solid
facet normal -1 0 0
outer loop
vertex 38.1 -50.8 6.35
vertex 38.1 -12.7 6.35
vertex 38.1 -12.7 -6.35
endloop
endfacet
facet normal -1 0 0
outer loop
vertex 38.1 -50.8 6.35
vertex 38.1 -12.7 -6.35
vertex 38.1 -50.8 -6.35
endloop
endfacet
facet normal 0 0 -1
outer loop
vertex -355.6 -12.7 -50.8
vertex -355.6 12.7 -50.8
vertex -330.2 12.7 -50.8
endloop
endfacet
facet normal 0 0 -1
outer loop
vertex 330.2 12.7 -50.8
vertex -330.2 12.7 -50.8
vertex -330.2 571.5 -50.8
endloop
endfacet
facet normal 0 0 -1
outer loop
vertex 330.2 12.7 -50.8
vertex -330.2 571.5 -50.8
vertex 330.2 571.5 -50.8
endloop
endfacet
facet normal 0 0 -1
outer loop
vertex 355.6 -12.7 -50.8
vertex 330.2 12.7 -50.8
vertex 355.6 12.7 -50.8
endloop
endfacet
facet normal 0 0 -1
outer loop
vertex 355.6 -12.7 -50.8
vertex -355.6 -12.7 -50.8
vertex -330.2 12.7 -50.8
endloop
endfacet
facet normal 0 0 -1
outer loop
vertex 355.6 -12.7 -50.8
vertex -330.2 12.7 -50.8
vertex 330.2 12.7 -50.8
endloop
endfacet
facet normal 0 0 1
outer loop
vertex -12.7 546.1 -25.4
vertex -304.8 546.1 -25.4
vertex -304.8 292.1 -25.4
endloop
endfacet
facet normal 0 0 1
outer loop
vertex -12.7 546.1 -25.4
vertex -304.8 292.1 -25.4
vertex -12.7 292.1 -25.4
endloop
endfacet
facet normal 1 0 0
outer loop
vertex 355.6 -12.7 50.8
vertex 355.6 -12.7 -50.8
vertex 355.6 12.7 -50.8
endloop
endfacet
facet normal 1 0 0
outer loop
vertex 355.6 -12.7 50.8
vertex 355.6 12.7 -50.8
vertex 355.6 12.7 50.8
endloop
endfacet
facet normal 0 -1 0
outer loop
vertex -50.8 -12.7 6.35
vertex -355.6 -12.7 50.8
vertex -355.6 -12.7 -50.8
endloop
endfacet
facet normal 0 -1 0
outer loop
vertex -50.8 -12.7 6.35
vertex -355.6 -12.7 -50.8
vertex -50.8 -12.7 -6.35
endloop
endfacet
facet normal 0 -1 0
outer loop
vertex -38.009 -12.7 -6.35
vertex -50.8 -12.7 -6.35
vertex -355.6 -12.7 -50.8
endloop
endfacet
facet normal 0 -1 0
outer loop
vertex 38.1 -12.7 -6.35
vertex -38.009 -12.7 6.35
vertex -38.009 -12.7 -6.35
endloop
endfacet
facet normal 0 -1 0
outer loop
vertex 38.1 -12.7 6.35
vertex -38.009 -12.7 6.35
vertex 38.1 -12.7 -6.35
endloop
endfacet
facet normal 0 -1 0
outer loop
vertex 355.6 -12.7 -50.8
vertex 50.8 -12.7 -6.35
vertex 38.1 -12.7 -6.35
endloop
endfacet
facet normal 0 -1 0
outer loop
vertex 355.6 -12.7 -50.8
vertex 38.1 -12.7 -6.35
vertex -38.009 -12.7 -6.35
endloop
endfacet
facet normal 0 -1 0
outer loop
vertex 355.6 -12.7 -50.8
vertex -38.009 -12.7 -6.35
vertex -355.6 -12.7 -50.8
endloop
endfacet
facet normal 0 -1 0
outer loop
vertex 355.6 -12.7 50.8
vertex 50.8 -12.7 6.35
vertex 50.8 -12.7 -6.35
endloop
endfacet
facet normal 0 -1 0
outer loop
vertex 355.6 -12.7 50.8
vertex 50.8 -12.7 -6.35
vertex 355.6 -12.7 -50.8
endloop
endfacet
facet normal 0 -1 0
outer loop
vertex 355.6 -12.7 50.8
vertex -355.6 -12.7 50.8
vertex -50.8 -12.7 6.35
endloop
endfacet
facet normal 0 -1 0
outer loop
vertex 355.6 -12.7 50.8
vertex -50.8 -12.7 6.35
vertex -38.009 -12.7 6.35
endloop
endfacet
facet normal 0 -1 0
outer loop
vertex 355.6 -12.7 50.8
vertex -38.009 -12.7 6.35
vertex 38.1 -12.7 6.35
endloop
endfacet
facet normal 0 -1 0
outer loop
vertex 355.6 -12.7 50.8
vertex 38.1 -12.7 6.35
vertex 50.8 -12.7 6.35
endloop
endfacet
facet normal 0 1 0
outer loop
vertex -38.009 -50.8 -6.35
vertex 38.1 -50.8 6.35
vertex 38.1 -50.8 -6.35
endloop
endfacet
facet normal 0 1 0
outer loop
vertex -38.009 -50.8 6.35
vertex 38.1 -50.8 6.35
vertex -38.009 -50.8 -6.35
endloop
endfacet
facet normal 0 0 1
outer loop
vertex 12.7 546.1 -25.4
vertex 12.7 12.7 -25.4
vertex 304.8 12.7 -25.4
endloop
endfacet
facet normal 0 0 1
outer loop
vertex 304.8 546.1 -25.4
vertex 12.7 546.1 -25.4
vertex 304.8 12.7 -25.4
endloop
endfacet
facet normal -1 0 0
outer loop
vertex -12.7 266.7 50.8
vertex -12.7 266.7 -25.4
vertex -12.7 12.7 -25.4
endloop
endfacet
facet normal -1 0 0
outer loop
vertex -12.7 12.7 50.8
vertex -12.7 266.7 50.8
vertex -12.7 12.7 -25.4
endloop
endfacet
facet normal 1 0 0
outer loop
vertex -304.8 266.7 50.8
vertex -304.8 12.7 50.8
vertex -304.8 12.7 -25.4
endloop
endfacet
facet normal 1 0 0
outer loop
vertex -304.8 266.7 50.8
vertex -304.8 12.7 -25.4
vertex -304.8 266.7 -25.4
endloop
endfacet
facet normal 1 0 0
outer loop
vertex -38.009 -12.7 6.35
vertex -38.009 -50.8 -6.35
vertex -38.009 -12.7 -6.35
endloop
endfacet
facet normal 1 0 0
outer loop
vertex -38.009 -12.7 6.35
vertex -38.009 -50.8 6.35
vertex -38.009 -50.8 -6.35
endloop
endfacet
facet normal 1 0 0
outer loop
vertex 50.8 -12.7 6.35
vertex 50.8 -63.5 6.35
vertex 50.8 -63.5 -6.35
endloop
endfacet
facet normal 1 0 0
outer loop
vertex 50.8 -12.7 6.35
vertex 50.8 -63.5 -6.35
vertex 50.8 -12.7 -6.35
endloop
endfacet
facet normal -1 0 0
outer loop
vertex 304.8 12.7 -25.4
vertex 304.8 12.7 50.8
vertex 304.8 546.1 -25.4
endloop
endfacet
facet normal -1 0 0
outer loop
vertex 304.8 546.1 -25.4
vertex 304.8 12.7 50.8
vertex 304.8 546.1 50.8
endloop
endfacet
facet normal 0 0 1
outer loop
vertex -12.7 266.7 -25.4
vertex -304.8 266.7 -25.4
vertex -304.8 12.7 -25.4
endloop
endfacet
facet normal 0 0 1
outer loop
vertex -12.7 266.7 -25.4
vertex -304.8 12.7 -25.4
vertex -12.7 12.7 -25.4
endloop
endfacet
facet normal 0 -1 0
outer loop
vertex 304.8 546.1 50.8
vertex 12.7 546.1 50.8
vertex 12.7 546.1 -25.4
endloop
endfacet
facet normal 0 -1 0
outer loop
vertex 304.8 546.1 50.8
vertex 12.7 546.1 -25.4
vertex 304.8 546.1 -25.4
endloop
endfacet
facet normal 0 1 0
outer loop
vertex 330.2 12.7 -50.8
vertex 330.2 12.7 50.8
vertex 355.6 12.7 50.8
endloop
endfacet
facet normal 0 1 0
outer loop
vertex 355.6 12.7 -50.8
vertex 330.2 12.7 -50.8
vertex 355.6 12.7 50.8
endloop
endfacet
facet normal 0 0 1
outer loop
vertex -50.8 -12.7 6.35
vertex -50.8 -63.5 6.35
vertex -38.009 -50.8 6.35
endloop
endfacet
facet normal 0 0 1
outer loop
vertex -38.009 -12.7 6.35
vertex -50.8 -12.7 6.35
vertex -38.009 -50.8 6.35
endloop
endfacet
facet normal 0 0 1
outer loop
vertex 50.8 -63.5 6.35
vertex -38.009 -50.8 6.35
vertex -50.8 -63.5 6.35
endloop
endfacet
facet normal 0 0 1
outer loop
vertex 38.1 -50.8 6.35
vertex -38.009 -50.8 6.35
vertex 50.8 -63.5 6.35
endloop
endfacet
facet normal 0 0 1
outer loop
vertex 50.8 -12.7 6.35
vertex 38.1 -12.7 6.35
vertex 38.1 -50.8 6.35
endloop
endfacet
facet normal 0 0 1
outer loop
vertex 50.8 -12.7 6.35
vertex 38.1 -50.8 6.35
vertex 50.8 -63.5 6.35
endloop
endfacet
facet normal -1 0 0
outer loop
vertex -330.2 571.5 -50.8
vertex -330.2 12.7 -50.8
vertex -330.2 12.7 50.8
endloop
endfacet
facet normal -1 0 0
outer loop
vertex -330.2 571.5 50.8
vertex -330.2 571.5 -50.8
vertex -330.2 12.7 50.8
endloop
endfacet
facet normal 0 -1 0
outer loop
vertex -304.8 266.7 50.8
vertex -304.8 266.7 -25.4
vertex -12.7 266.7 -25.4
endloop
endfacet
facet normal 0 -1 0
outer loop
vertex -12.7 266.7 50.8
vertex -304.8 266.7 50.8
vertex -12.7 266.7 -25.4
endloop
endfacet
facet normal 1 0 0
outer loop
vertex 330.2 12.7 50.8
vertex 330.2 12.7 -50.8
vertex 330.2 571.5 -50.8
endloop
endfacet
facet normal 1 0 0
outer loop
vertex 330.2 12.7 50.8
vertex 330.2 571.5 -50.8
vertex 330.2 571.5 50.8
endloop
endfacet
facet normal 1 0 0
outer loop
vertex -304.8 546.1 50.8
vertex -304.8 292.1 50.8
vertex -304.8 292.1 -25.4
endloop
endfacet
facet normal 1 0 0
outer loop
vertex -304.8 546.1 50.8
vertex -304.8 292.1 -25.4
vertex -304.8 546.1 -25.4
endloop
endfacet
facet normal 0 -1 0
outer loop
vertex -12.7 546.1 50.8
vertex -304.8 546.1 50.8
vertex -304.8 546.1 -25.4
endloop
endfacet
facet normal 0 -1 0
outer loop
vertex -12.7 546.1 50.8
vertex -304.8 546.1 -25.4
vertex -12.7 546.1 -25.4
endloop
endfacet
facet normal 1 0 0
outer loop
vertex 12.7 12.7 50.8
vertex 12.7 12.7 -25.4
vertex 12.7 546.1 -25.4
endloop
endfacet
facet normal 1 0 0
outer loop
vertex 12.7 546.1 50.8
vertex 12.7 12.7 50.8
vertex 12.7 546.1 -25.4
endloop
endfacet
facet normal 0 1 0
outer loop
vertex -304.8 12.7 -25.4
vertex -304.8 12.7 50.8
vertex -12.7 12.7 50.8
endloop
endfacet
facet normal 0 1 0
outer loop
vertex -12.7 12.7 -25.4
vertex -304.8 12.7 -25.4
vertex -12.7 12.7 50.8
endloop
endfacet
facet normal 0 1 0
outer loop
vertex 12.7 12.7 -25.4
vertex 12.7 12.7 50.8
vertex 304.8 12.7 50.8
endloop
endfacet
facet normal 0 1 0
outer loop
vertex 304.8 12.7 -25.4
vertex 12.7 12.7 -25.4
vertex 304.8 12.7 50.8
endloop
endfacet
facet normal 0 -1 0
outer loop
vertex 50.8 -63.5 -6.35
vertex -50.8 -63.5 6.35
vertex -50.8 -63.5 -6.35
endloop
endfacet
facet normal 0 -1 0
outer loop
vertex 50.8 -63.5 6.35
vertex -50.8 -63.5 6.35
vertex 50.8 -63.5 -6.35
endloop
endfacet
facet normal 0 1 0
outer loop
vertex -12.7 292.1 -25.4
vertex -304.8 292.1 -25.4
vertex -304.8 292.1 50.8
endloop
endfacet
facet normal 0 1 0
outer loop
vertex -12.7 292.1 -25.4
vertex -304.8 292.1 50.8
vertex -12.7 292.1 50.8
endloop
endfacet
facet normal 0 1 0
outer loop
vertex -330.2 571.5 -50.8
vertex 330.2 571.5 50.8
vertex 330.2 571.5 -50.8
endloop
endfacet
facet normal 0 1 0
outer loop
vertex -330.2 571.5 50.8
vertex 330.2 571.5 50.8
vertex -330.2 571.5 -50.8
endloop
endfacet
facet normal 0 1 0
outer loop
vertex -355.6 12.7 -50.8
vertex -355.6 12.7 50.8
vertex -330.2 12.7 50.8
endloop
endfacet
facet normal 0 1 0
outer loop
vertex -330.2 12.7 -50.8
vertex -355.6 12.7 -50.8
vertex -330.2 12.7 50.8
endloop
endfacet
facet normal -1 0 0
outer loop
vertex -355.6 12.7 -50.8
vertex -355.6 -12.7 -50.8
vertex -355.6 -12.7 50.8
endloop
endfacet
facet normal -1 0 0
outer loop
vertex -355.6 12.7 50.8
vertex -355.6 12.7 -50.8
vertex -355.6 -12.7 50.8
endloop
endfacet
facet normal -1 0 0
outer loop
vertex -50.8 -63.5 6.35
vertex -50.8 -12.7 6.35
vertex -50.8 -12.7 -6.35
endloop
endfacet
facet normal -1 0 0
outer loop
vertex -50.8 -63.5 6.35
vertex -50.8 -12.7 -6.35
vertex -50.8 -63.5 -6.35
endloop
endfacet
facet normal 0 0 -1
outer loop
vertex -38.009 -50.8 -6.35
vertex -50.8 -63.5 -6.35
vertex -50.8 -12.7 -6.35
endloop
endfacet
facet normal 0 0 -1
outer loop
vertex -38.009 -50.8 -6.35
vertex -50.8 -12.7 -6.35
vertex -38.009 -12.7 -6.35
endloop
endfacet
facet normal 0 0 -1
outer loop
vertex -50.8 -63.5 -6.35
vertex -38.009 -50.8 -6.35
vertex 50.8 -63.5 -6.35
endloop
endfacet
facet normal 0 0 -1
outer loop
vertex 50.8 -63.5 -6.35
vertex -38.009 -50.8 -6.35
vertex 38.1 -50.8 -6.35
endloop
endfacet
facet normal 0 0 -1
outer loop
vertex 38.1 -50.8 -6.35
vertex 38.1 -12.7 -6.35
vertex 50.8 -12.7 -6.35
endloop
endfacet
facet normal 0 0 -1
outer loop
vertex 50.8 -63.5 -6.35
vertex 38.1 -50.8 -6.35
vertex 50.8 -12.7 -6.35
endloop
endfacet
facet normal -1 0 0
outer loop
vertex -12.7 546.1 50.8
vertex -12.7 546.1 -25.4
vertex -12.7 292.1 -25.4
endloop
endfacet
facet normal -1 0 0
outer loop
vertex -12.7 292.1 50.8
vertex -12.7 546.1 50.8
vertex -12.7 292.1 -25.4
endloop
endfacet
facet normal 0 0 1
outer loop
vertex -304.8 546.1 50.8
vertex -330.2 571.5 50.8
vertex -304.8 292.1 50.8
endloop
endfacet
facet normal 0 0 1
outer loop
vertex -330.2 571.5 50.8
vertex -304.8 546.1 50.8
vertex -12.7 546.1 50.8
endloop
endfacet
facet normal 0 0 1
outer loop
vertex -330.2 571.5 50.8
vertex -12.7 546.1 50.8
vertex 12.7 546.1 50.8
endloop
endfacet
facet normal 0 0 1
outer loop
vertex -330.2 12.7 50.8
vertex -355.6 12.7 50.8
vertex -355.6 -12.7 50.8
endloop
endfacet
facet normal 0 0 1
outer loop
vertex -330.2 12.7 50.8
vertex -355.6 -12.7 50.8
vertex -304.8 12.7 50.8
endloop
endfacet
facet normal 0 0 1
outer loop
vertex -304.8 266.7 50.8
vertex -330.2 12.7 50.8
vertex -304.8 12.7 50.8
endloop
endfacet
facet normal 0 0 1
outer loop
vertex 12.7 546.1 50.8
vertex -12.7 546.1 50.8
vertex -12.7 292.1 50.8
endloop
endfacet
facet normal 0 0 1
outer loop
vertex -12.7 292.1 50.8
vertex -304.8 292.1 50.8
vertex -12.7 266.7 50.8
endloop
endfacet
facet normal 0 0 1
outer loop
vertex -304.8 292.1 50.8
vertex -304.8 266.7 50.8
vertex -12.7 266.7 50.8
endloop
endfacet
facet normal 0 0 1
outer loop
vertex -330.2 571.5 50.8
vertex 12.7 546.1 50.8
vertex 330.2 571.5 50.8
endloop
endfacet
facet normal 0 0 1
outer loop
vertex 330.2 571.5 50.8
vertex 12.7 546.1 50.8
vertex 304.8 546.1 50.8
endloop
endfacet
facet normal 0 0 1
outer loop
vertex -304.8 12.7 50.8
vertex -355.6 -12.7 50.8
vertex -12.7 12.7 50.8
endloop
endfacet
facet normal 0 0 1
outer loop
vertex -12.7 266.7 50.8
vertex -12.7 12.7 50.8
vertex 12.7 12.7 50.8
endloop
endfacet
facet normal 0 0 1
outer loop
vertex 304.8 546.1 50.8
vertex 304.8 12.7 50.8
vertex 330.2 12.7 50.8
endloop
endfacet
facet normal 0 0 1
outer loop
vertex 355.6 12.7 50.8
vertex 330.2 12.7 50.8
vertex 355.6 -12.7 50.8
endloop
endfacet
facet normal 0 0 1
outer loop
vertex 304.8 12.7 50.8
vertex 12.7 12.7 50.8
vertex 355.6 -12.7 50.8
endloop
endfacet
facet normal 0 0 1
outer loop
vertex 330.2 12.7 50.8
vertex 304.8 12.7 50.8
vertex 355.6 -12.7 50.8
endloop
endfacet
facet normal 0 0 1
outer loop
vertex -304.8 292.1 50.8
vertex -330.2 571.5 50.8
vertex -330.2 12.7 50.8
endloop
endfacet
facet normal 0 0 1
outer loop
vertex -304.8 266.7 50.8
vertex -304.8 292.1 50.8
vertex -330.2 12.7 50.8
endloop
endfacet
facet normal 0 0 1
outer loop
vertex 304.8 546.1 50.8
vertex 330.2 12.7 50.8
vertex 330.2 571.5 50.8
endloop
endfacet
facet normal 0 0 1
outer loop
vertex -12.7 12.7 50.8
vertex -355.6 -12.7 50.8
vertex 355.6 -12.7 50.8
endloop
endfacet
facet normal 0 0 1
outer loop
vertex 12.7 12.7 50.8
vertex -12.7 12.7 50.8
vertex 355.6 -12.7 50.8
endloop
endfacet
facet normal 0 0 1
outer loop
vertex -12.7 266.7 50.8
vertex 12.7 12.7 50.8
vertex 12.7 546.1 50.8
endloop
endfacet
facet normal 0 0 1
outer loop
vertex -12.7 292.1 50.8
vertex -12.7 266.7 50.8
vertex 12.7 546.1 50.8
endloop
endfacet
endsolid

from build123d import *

# Parameters (mm, degrees)
F0_W      = 711.2
F0_H      = 101.6
F1_DEPTH  = 12.7
F2_W      = 660.4
F2_H      = 101.6
F3_DEPTH  = 558.8
F4_W      = 609.6
F4_H      = 533.4
F5_DEPTH  = 76.2
F7_DEPTH  = 6.35
F9_W      = 292.1
F9_H      = 25.4
F10_DEPTH = 76.2


with BuildPart() as f1:
    # F0 (on Front) → F1 (new body, symmetric)
    with BuildSketch(Plane.XZ):
        Rectangle(F0_W, F0_H)
    extrude(amount=F1_DEPTH, both=True)

    # F2 (on face) → F3 (join)
    with BuildSketch(Plane(origin=(0, 12.7, 0), x_dir=(-1, 0, 0), z_dir=(0, 1, 0))):
        Rectangle(F2_W, F2_H)
    extrude(amount=F3_DEPTH)

    # F4 (on face) → F5 (cut)
    with BuildSketch(Plane.XY.offset(50.8)):
        with Locations((0, 279.4)):
            Rectangle(F4_W, F4_H)
    extrude(amount=-F5_DEPTH, mode=Mode.SUBTRACT)

    # F6 (on Top) → F7 (join, symmetric)
    with BuildSketch(Plane.XY):
        Polygon((-38.009446, -12.7), (-50.8, -12.7), (-50.8, -63.5), (50.8, -63.5), (50.8, -12.7), (38.1, -12.7), (38.1, -50.8), (-38.009446, -50.8), align=None)
    extrude(amount=F7_DEPTH, both=True)

    # F9 (on face) → F10 (join)
    with BuildSketch(Plane.XY.offset(-25.4)):
        with Locations((-158.75, 279.4)):
            Rectangle(F9_W, F9_H)
        Polygon((-12.7, 546.1), (-12.7, 292.1), (-12.7, 266.7), (-12.7, 12.7), (12.7, 12.7), (12.7, 546.1), align=None)
    extrude(amount=F10_DEPTH)


solid = f1.part
